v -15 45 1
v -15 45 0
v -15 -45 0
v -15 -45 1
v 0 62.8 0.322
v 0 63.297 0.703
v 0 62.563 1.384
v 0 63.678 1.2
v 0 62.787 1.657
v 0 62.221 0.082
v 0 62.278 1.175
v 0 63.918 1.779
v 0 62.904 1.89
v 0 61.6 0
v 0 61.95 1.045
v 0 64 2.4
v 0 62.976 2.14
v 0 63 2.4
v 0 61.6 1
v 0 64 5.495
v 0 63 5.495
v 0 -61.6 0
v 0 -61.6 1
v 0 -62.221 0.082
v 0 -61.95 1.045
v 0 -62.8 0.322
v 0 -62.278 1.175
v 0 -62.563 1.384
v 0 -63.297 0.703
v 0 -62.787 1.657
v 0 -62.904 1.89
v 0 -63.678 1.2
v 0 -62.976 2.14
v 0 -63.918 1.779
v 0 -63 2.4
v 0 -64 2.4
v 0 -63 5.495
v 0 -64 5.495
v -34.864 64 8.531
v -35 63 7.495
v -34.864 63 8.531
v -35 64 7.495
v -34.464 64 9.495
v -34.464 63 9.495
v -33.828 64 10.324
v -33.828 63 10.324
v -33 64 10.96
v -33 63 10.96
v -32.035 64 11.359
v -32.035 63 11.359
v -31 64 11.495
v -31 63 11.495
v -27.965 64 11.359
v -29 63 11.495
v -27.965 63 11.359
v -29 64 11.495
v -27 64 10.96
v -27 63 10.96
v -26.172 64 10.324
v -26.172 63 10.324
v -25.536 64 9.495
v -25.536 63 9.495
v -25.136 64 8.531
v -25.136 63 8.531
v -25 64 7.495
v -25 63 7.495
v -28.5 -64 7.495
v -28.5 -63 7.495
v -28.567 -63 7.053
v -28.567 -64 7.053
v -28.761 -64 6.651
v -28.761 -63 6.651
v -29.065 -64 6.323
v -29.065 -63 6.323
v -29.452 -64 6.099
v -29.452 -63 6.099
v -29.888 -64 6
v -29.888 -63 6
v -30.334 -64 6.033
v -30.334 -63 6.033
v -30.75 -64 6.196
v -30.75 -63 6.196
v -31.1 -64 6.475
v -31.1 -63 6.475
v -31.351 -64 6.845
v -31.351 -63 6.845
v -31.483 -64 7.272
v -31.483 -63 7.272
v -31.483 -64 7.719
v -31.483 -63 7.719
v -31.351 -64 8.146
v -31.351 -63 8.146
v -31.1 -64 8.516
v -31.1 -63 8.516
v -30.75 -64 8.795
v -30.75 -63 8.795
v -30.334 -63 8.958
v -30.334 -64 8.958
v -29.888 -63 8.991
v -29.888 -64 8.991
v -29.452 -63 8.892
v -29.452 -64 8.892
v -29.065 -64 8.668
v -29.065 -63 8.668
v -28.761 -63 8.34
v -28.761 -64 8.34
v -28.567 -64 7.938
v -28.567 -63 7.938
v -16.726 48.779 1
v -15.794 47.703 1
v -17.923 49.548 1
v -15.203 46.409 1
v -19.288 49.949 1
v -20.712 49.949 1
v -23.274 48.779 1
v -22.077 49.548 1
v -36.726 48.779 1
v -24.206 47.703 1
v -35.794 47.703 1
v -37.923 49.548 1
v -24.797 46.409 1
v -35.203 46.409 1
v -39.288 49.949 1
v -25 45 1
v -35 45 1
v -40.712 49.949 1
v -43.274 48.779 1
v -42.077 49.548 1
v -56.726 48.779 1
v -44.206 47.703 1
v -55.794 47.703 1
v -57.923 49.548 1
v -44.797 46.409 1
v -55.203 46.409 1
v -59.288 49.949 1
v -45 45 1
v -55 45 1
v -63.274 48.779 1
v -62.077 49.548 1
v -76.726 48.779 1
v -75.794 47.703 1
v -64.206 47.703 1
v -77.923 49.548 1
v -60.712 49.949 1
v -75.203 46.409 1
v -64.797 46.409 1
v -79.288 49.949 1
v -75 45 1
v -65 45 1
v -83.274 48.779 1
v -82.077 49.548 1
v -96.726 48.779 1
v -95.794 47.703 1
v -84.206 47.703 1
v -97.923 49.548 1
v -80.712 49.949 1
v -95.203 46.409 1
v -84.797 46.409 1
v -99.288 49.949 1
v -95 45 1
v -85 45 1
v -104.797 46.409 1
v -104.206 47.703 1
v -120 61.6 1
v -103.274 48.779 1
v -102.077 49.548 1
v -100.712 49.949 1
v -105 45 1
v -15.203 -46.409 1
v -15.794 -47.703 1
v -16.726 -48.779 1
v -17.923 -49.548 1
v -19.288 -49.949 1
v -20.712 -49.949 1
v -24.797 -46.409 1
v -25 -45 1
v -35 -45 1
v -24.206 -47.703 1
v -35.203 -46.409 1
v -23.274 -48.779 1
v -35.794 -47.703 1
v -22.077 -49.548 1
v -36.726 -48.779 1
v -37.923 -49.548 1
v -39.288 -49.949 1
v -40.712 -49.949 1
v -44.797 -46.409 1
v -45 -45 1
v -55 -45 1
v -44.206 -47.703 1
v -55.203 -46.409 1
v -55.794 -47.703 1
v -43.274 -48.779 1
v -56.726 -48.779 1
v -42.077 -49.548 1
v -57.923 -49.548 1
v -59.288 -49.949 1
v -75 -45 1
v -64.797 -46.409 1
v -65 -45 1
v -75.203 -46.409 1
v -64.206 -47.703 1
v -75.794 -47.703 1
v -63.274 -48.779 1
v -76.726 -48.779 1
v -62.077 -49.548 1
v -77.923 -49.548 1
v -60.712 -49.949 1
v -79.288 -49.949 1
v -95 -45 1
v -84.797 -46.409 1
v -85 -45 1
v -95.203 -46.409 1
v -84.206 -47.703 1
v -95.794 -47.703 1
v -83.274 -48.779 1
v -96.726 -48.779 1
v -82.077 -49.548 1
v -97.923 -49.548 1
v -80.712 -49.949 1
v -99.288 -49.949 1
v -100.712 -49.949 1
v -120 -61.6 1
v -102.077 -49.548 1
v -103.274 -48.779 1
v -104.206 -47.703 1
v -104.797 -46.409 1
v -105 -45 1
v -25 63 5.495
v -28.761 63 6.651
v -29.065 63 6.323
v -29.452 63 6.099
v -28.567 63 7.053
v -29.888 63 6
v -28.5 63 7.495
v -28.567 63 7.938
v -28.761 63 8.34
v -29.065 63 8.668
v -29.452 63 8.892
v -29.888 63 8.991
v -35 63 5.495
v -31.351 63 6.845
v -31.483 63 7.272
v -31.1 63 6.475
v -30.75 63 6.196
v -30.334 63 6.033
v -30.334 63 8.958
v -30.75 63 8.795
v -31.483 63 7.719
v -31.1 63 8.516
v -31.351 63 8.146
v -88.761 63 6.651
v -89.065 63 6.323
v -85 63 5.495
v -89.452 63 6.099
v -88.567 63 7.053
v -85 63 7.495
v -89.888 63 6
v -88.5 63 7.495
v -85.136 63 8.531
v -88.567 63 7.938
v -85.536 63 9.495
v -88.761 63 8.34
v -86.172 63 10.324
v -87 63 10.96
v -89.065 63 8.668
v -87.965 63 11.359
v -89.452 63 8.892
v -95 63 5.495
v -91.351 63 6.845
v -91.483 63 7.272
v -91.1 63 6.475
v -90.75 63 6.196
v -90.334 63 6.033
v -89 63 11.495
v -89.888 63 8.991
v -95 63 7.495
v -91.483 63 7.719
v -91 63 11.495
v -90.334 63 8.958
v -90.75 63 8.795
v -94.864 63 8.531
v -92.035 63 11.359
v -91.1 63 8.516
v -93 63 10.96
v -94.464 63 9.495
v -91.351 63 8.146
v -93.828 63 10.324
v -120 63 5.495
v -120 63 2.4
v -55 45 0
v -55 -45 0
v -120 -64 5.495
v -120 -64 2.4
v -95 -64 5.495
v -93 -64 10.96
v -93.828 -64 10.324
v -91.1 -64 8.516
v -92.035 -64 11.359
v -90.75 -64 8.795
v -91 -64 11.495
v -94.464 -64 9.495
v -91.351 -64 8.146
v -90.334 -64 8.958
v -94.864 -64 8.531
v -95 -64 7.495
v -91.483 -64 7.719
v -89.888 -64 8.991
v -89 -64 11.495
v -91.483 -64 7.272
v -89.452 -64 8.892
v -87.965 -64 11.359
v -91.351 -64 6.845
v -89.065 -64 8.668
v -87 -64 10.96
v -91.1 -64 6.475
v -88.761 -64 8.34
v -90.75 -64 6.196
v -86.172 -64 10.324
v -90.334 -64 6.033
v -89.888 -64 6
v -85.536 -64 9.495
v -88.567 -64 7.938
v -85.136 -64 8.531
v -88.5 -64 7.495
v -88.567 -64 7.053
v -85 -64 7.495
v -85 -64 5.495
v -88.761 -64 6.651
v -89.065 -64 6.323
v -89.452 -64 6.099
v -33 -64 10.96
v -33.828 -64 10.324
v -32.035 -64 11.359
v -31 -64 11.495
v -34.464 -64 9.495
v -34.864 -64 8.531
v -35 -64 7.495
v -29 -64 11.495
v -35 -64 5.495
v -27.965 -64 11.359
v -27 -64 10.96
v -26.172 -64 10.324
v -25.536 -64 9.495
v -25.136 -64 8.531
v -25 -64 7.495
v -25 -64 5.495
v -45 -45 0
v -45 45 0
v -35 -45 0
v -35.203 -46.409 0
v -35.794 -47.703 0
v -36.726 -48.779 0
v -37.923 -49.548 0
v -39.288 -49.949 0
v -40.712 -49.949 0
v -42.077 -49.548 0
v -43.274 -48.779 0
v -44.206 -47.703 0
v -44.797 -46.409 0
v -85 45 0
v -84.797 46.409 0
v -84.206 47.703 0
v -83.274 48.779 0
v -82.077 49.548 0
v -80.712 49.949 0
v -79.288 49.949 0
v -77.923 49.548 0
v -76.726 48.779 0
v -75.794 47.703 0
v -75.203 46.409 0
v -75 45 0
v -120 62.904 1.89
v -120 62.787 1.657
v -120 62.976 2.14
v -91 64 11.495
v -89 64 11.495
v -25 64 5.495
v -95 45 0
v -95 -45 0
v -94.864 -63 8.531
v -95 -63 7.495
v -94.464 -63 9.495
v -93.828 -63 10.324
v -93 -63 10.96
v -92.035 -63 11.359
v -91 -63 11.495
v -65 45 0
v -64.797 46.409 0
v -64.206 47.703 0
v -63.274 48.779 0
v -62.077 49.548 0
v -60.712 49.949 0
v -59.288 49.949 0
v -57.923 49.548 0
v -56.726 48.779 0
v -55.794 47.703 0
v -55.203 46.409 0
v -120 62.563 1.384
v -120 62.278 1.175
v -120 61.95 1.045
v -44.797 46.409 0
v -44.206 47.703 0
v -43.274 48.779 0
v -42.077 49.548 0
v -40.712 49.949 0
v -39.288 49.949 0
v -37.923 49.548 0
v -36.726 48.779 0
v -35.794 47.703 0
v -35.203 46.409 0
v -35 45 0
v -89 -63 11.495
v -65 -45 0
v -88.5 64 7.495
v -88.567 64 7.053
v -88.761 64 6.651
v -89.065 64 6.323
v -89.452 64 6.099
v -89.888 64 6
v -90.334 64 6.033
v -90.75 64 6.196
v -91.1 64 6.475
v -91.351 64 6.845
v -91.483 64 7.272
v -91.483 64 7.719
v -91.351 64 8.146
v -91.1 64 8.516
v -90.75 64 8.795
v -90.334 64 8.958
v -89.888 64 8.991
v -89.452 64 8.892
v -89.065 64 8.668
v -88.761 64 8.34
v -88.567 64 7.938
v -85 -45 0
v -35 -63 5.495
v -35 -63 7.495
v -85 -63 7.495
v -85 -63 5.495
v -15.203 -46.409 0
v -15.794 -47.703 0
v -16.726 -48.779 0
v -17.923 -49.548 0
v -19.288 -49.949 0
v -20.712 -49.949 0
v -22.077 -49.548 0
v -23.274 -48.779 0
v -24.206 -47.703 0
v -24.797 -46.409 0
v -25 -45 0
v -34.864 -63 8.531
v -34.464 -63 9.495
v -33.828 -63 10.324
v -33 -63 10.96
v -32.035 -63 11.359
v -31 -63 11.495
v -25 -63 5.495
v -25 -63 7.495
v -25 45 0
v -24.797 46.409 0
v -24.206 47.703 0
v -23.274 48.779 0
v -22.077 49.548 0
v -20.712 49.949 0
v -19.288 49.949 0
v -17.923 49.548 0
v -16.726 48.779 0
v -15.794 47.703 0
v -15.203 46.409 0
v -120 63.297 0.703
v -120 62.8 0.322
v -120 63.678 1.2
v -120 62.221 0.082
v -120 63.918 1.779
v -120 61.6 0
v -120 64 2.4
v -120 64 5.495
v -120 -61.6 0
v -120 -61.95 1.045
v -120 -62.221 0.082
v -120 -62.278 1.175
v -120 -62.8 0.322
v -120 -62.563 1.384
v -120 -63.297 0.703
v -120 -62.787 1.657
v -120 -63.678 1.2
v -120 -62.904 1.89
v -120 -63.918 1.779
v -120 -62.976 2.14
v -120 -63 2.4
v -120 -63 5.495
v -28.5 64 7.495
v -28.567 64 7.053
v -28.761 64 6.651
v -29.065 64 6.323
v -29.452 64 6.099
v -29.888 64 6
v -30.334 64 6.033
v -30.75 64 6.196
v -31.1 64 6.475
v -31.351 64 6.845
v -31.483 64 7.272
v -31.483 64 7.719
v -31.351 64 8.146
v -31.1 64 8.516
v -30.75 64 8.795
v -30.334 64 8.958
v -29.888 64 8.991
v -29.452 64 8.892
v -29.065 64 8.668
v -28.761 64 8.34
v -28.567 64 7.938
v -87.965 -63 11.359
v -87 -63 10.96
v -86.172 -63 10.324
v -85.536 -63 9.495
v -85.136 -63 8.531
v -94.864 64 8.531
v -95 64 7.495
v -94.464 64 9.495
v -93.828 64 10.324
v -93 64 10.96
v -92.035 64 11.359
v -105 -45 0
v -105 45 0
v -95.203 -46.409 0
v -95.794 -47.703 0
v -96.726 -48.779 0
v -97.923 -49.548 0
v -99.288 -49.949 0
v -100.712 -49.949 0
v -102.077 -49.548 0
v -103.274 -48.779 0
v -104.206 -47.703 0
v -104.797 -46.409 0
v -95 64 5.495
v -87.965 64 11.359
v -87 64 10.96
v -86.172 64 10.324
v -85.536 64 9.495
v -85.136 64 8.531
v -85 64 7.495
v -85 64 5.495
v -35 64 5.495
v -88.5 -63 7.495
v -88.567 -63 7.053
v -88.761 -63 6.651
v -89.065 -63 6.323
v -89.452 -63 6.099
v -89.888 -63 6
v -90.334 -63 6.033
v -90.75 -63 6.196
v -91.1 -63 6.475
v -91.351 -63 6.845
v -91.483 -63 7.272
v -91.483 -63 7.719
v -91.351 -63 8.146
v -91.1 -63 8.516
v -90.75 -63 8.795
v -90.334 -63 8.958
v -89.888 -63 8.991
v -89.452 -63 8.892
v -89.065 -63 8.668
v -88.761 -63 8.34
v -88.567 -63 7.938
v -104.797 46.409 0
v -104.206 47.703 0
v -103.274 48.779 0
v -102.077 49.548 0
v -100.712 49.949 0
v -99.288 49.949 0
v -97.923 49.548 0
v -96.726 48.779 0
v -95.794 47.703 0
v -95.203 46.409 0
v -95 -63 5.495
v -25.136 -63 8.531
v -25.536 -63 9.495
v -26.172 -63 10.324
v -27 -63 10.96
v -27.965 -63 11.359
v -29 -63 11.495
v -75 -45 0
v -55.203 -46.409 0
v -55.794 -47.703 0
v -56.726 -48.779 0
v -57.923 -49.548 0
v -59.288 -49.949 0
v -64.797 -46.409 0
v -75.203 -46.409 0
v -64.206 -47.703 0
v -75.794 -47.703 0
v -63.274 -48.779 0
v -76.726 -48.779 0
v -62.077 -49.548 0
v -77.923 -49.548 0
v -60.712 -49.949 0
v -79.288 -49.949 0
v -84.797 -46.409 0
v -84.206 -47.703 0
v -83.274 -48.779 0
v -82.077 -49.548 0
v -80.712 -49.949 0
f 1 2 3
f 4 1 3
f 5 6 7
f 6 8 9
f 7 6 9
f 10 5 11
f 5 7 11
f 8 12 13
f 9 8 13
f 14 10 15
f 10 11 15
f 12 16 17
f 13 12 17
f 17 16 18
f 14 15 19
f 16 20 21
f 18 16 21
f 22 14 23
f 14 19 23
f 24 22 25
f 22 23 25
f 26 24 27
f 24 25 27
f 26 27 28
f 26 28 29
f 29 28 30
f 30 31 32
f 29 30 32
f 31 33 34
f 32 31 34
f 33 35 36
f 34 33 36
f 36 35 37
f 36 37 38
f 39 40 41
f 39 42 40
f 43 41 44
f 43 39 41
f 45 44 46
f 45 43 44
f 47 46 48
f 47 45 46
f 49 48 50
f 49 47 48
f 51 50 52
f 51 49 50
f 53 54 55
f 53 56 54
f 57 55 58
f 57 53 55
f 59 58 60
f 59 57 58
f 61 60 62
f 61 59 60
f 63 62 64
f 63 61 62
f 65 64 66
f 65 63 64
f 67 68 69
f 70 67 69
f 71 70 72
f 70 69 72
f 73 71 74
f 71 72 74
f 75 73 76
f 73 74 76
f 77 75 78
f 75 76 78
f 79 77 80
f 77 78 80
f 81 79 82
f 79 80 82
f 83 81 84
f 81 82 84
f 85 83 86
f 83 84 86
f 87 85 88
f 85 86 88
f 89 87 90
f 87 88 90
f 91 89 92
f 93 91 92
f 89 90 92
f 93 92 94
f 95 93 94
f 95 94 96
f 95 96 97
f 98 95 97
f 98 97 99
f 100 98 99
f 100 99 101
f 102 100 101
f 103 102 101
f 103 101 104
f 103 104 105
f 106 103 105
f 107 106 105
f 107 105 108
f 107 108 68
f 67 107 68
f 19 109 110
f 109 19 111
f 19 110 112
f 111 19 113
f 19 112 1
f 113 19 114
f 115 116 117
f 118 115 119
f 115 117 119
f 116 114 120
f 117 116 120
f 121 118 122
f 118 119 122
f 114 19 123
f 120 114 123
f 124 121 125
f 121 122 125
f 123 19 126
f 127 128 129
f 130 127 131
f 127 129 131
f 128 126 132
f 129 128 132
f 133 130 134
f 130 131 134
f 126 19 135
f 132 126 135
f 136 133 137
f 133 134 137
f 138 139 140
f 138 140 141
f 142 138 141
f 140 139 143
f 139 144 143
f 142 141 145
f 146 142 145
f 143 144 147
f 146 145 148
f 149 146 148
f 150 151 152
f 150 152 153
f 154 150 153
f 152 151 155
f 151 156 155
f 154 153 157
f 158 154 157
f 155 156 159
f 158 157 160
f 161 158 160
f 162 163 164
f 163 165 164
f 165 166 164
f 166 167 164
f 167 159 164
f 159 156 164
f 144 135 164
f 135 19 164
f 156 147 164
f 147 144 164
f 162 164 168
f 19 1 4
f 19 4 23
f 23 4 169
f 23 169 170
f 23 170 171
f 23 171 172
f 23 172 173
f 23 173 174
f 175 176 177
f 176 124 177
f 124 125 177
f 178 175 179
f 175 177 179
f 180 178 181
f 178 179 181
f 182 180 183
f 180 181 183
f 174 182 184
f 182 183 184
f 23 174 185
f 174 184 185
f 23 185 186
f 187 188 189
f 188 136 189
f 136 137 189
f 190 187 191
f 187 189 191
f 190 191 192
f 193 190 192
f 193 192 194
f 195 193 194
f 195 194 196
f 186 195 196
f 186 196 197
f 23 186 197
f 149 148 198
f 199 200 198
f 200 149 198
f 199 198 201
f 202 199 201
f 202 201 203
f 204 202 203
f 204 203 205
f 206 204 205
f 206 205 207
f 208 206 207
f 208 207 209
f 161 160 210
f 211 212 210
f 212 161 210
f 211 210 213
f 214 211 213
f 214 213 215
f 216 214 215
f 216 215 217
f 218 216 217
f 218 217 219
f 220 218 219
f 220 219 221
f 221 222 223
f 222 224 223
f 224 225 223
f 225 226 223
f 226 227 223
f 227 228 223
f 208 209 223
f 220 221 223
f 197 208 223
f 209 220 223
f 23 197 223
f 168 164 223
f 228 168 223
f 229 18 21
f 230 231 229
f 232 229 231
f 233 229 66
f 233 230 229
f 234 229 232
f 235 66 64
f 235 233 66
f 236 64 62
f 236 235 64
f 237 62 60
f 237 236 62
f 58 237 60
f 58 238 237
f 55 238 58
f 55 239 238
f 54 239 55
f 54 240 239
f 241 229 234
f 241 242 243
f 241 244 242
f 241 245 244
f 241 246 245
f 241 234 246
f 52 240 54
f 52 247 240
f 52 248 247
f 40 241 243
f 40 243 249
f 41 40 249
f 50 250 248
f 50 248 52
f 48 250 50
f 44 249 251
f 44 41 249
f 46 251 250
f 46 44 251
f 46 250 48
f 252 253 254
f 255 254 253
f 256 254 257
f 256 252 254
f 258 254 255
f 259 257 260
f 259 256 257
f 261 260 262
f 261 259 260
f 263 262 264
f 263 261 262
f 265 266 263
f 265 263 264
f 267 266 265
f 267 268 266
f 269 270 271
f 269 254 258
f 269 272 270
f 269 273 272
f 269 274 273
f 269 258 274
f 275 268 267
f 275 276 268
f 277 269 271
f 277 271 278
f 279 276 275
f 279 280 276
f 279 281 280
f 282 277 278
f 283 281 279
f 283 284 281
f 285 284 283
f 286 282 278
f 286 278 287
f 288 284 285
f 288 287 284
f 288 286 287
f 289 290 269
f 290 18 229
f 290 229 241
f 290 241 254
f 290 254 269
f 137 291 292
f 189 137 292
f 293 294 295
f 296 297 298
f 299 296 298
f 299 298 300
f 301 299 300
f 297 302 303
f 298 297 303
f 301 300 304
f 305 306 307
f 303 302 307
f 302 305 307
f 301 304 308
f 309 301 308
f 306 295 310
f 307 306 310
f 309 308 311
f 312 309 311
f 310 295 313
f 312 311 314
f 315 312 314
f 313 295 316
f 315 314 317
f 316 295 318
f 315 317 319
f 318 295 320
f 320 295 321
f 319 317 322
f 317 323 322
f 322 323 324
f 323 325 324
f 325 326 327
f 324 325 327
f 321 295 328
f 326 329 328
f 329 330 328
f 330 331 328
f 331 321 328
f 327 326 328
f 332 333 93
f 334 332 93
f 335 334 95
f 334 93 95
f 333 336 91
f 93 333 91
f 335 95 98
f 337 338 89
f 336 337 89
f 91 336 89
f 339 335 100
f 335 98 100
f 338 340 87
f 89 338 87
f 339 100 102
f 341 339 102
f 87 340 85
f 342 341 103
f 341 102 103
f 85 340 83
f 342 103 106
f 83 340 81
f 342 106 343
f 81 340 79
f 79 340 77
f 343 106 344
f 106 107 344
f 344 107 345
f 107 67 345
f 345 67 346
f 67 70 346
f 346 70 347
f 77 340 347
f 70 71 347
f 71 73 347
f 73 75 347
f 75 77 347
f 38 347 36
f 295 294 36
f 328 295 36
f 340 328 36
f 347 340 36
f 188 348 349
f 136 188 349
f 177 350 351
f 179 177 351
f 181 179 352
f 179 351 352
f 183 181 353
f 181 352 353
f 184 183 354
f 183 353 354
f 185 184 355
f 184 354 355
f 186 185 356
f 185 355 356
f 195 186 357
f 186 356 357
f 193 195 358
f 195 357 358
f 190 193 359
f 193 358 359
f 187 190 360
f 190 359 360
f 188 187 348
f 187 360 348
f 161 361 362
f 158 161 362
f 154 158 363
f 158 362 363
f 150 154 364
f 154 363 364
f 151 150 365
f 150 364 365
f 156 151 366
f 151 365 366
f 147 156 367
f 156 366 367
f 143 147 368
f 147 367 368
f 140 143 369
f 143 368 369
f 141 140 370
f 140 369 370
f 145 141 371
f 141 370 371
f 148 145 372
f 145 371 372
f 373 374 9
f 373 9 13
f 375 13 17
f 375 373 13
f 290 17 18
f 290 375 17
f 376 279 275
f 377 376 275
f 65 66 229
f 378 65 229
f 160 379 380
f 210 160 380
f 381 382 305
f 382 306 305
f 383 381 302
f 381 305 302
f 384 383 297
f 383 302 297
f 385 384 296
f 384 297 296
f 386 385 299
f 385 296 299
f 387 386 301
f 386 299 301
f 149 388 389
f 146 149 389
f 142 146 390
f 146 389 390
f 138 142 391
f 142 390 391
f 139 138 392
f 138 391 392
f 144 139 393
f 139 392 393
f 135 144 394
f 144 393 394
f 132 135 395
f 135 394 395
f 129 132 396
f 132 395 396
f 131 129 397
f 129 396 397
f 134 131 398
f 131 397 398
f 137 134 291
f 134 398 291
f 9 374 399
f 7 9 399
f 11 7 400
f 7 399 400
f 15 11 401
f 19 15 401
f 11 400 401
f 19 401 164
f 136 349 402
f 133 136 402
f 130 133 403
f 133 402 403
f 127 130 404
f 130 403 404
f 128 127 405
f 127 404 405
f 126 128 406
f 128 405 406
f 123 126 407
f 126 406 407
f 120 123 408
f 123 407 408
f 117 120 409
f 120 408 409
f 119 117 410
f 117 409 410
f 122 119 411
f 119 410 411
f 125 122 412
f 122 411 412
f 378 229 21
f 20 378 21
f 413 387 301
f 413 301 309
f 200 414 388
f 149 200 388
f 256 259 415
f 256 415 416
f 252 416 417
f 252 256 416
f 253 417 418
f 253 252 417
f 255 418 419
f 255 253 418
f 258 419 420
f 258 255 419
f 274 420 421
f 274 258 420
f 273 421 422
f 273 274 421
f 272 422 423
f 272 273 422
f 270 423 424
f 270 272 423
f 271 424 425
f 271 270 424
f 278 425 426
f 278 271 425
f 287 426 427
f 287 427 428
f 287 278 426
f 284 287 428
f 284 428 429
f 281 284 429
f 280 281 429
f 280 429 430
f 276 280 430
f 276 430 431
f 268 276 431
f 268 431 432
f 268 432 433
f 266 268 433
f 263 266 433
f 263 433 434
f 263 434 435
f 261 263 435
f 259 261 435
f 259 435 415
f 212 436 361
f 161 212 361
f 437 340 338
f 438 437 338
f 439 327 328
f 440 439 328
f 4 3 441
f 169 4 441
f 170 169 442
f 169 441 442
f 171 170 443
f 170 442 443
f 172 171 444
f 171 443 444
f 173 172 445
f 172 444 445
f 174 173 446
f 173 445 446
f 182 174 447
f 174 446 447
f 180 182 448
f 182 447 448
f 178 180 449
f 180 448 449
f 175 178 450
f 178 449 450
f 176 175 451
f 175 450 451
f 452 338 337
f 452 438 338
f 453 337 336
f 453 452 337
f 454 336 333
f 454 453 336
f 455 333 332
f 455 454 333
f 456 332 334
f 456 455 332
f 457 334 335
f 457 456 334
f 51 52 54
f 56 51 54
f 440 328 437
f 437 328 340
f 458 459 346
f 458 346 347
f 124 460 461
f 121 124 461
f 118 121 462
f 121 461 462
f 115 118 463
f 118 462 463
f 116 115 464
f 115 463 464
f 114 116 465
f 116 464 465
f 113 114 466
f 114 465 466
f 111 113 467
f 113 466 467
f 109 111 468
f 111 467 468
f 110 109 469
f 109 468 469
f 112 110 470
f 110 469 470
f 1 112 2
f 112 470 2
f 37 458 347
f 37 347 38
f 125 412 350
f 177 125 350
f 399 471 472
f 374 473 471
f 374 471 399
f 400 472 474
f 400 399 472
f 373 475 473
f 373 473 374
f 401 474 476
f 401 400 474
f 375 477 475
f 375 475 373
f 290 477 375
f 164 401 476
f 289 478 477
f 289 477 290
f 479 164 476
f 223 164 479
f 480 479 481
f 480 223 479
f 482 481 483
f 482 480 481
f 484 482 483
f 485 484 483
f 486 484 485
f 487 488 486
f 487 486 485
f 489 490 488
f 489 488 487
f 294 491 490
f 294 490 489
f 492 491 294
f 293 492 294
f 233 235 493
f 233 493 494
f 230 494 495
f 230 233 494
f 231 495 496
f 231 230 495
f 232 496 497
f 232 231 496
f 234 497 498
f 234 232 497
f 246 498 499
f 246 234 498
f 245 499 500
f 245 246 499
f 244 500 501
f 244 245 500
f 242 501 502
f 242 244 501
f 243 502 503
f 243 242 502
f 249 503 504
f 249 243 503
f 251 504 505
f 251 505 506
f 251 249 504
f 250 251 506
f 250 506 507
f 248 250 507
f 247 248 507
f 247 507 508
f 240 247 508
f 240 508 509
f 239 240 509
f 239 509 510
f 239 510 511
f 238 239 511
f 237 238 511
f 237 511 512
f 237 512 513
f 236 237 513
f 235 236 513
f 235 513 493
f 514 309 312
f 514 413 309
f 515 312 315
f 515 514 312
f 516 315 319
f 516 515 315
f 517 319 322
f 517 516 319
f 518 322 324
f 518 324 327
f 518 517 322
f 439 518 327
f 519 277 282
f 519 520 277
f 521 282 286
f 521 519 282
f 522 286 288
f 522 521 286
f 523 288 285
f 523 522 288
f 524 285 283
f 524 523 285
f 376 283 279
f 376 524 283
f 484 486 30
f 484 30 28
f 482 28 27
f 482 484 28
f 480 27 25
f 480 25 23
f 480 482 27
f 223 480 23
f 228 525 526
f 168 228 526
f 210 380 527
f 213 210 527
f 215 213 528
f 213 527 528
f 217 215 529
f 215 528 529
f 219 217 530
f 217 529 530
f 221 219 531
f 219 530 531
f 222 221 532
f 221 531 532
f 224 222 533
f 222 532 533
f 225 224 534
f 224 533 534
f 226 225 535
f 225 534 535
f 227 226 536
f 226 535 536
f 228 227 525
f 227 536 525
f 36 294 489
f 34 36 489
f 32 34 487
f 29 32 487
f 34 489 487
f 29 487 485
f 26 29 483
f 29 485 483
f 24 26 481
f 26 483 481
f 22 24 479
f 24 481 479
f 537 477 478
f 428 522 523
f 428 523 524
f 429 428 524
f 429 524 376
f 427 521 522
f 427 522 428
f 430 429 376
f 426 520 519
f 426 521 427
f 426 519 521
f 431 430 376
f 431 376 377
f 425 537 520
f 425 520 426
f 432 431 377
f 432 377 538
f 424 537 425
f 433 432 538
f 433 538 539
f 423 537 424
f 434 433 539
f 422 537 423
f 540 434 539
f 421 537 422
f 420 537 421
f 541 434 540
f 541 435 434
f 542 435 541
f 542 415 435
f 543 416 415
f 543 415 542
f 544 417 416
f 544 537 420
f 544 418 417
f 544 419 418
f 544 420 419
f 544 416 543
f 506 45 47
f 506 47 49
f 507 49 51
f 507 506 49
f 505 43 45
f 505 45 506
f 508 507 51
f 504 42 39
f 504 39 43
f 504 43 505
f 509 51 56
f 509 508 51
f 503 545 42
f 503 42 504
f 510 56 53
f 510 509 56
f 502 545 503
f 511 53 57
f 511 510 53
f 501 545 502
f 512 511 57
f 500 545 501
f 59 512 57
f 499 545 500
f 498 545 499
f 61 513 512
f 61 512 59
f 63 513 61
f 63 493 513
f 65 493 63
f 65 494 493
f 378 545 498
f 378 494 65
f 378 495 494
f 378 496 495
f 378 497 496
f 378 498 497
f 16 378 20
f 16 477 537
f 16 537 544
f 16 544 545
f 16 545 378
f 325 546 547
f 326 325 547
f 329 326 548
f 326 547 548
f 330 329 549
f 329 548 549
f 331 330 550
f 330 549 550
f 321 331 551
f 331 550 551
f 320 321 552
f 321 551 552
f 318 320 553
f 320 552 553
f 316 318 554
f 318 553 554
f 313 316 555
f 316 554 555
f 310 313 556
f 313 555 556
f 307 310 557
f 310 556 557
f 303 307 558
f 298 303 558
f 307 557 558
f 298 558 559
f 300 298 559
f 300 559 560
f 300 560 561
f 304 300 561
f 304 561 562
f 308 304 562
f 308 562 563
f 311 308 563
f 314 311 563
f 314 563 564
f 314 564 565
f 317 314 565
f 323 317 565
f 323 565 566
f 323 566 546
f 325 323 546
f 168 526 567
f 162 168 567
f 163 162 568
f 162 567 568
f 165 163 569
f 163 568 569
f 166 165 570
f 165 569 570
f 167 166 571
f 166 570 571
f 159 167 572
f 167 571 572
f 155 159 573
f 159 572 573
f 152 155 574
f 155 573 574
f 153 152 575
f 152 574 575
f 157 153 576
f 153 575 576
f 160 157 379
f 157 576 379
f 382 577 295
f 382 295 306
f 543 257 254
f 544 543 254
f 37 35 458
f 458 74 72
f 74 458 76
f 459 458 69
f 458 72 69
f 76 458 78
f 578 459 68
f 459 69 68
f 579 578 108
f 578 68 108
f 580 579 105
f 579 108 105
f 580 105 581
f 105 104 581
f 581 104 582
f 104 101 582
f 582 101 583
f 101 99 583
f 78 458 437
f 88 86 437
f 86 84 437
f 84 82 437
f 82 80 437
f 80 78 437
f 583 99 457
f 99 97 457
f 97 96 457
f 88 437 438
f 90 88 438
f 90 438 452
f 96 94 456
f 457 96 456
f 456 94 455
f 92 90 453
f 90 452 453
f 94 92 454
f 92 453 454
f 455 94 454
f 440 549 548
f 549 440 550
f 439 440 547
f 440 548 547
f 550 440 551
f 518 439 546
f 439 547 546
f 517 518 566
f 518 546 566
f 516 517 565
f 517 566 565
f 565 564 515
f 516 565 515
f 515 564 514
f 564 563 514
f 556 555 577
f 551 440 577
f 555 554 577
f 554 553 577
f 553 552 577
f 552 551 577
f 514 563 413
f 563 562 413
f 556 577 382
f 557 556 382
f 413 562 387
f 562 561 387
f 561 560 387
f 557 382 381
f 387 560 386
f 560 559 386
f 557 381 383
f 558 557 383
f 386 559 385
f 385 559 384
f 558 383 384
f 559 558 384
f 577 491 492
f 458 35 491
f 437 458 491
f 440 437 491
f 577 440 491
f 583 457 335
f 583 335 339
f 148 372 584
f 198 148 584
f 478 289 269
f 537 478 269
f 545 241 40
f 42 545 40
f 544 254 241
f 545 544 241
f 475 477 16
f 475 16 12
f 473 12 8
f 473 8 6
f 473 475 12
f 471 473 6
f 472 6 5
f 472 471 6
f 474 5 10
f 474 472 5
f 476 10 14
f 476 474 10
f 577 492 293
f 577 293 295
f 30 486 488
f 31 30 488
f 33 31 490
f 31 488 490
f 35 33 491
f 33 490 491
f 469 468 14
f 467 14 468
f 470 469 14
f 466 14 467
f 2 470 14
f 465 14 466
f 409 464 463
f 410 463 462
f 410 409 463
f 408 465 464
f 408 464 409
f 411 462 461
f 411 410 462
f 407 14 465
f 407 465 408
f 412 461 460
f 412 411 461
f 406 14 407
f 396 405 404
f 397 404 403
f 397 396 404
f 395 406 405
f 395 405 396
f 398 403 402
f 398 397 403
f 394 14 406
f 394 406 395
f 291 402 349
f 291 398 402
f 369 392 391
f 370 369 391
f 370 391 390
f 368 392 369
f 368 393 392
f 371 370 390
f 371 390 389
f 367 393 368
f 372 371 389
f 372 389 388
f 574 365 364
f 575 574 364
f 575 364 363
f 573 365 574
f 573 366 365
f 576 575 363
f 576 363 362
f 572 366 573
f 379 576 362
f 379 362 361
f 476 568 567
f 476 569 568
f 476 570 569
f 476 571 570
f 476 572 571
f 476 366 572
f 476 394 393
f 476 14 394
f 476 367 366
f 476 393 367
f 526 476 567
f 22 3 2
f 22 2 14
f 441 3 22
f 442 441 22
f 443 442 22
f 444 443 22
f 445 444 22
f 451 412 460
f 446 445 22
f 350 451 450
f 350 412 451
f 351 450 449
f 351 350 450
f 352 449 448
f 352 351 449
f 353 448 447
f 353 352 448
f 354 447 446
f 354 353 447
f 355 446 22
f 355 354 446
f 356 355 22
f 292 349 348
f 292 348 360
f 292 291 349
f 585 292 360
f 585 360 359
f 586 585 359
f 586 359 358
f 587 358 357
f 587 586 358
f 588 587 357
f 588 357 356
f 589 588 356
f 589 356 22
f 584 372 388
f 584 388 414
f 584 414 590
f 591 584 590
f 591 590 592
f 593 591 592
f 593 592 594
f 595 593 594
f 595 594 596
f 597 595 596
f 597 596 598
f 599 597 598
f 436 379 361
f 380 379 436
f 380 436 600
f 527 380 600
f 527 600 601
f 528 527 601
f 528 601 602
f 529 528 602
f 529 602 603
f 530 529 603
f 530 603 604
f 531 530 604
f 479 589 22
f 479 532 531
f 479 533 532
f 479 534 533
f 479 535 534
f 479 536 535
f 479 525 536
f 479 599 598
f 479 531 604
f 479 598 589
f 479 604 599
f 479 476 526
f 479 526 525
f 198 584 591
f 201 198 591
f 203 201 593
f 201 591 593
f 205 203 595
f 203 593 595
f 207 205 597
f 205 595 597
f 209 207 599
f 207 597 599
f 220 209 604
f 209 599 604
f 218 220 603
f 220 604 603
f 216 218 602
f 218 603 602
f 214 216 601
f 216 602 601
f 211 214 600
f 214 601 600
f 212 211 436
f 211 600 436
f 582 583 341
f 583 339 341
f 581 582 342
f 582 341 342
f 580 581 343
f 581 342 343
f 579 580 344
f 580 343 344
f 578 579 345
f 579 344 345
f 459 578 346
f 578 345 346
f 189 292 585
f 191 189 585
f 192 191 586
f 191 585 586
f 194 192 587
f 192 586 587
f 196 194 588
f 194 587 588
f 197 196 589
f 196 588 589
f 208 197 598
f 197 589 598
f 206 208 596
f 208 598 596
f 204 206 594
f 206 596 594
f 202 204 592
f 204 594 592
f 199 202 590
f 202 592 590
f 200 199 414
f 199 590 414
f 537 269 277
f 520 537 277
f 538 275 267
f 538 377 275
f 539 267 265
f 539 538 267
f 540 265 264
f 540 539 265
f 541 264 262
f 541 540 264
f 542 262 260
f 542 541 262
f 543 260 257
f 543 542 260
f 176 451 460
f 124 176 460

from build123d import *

# Parameters (mm, degrees)
CROQUIS1_W                      = 64
CROQUIS1_H                      = 120
CROQUIS1_R                      = 1.5
CROQUIS1_W_2                    = 2
CROQUIS1_H_2                    = 40
SALIENTE_EXTRUIR1_DEPTH         = 1
PLIEGUE_START                   = 63.746512
PLIEGUE_CROQUIZADO1_OUTLINE_W   = 120
PLIEGUE_CROQUIZADO1_OUTLINE_H   = 1
PLIEGUE_CROQUIZADO1_DEPTH       = 9.933488
PLIEGUE_START_2                 = 62.786512
PLIEGUE_CROQUIZADO1_2_OUTLINE_R = 1.5
PLIEGUE_CROQUIZADO1_2_DEPTH     = 1.213488
PLIEGUE_START_3                 = -121
PLIEGUE_CROQUIZADO1_3_DEPTH     = 122
PLIEGUE_START_4                 = -120
PLIEGUE_CROQUIZADO1_4_DEPTH     = 120
CORTAR_EXTRUIR1_REACH           = 138.485
CORTAR_EXTRUIR2_DEPTH           = 184
REDONDEO1_R                     = 4


with BuildPart() as part:
    # Croquis1 → Saliente-Extruir1 (new body)
    # profile 1 of 5: a face of its own
    with BuildSketch(Plane(origin=(0, 0, 0), x_dir=(0, 1, 0), z_dir=(0, 0, 1))):
        with Locations((32, 60)):
            Rectangle(CROQUIS1_W, CROQUIS1_H)
    # profile 2 of 5: a face of its own
    with BuildSketch(Plane(origin=(0, 0, 0), x_dir=(0, 1, 0), z_dir=(0, 0, 1))):
        Polygon((64, 120), (64, 0), (67.68, 0), (67.68, 25), (67.68, 40), (67.68, 80), (67.68, 95), (67.68, 120), align=None)
    # profile 3 of 5: a face of its own
    with BuildSketch(Plane(origin=(0, 0, 0), x_dir=(0, 1, 0), z_dir=(0, 0, 1))):
        Polygon((67.68, 40), (67.68, 25), (73.68, 25), (73.68, 40), (69.68, 40), align=None)
        with Locations(Location((69.68, 30, 0), (0, 0, 270))):
            Circle(CROQUIS1_R, mode=Mode.SUBTRACT)
    # profile 4 of 5: a face of its own
    with BuildSketch(Plane(origin=(0, 0, 0), x_dir=(0, 1, 0), z_dir=(0, 0, 1))):
        Polygon((73.68, 95), (67.68, 95), (67.68, 80), (69.68, 80), (73.68, 80), align=None)
        with Locations(Location((69.68, 90, 0), (0, 0, 270))):
            Circle(CROQUIS1_R, mode=Mode.SUBTRACT)
    # profile 5 of 5: a face of its own
    with BuildSketch(Plane(origin=(0, 0, 0), x_dir=(0, 1, 0), z_dir=(0, 0, 1))):
        with Locations((68.68, 60)):
            Rectangle(CROQUIS1_W_2, CROQUIS1_H_2)
    extrude(amount=SALIENTE_EXTRUIR1_DEPTH)

    # Pliegue croquizado1: read off the stored shape, not the designer's step
    # Pliegue croquizado1 outline → Pliegue croquizado1 (cut)
    with BuildSketch(Plane(origin=(0, 0, 0), x_dir=(1, 0, 0), z_dir=(0, 1, 0)).offset(PLIEGUE_START)):
        with Locations((-60, -0.5)):
            Rectangle(PLIEGUE_CROQUIZADO1_OUTLINE_W, PLIEGUE_CROQUIZADO1_OUTLINE_H)
    extrude(amount=PLIEGUE_CROQUIZADO1_DEPTH, mode=Mode.SUBTRACT)

    # Pliegue croquizado1 2 outline → Pliegue croquizado1 2 (add)
    with BuildSketch(Plane(origin=(0, 0, 0), x_dir=(1, 0, 0), z_dir=(0, 1, 0)).offset(PLIEGUE_START_2)):
        Polygon((-95, -11.495486979), (-80, -11.495486979), (-80, -7.495486979), (-40, -7.495486979), (-40, -11.495486979), (-25, -11.495486979), (-25, -5.495486979), (0, -5.495486979), (0, -1), (-120, -1), (-120, -5.495486979), (-95, -5.495486979), align=None)
        with Locations((-90, -7.495486979)):
            Circle(PLIEGUE_CROQUIZADO1_2_OUTLINE_R, mode=Mode.SUBTRACT)
        with Locations((-30, -7.495486979)):
            Circle(PLIEGUE_CROQUIZADO1_2_OUTLINE_R, mode=Mode.SUBTRACT)
    extrude(amount=PLIEGUE_CROQUIZADO1_2_DEPTH)

    # Pliegue croquizado1 3 outline → Pliegue croquizado1 3 (cut)
    with BuildSketch(Plane.YZ.offset(PLIEGUE_START_3)):
        with BuildLine():
            Line((63, 11.495486979), (62.786512, 11.495486979))
            Line((62.786512, 11.495486979), (62.786512, 1.656905608))
            ThreePointArc((62.786512, 1.656905608), (62.945569917, 2.013423228), (63, 2.4))
            Line((63, 2.4), (63, 11.495486979))
        make_face()
        with BuildLine():
            Line((64, 1), (64, 2.4))
            ThreePointArc((64, 2.4), (63.297056275, 0.702943725), (61.6, 0))
            Line((61.6, 0), (63.746512, 0))
            Line((63.746512, 0), (63.746512, 1))
            Line((63.746512, 1), (64, 1))
        make_face()
    extrude(amount=PLIEGUE_CROQUIZADO1_3_DEPTH, mode=Mode.SUBTRACT)

    # Pliegue croquizado1 4 outline → Pliegue croquizado1 4 (add)
    with BuildSketch(Plane.YZ.offset(PLIEGUE_START_4)):
        with BuildLine():
            Line((62.786512, 1), (62.786512, 1.656905608))
            ThreePointArc((62.786512, 1.656905608), (62.278110556, 1.175187331), (61.6, 1))
            Line((61.6, 1), (62.786512, 1))
        make_face()
    extrude(amount=PLIEGUE_CROQUIZADO1_4_DEPTH)

    # Simetría1: part across plane


with BuildPart() as part_1:
    add(part.part)
    add(part.part.mirror(Plane(origin=(0, 0, 1), x_dir=(0, 0, 1), z_dir=(0, 1, 0))))

    # Croquis7 → Cortar-Extruir1 (cut, up to next)
    with BuildSketch(Plane(origin=(0, 0, 0), x_dir=(-1, 0, 0), z_dir=(0, 0, -1)), mode=Mode.PRIVATE) as cortar_extruir1_sk1:
        with BuildLine():
            Line((35, 45.000000776), (35, -45.000000776))
            ThreePointArc((35, -45.000000776), (40.000000388, -50), (45, -45))
            Line((45, -45), (45, 45))
            ThreePointArc((45, 45), (40.000000388, 50), (35, 45.000000776))
        make_face()
    cortar_extruir1_tool1 = extrude(cortar_extruir1_sk1.sketch, amount=-CORTAR_EXTRUIR1_REACH, mode=Mode.PRIVATE) & part_1.part
    # Croquis7 → Cortar-Extruir1 (cut, up to next)
    with BuildSketch(Plane(origin=(0, 0, 0), x_dir=(-1, 0, 0), z_dir=(0, 0, -1)), mode=Mode.PRIVATE) as cortar_extruir1_sk2:
        with BuildLine():
            Line((15, 45.000000776), (15, -45.000000776))
            ThreePointArc((15, -45.000000776), (20.000000388, -50), (25, -45))
            Line((25, -45), (25, 45))
            ThreePointArc((25, 45), (20.000000388, 50), (15, 45.000000776))
        make_face()
    cortar_extruir1_tool2 = extrude(cortar_extruir1_sk2.sketch, amount=-CORTAR_EXTRUIR1_REACH, mode=Mode.PRIVATE) & part_1.part
    # Croquis7 → Cortar-Extruir1 (cut, up to next)
    with BuildSketch(Plane(origin=(0, 0, 0), x_dir=(-1, 0, 0), z_dir=(0, 0, -1)), mode=Mode.PRIVATE) as cortar_extruir1_sk3:
        with BuildLine():
            Line((55, 45.000000776), (55, -45.000000776))
            ThreePointArc((55, -45.000000776), (60.000000388, -50), (65, -45))
            Line((65, -45), (65, 45))
            ThreePointArc((65, 45), (60.000000388, 50), (55, 45.000000776))
        make_face()
    cortar_extruir1_tool3 = extrude(cortar_extruir1_sk3.sketch, amount=-CORTAR_EXTRUIR1_REACH, mode=Mode.PRIVATE) & part_1.part
    # Croquis7 → Cortar-Extruir1 (cut, up to next)
    with BuildSketch(Plane(origin=(0, 0, 0), x_dir=(-1, 0, 0), z_dir=(0, 0, -1)), mode=Mode.PRIVATE) as cortar_extruir1_sk4:
        with BuildLine():
            Line((75, 45.000000776), (75, -45.000000776))
            ThreePointArc((75, -45.000000776), (80.000000388, -50), (85, -45))
            Line((85, -45), (85, 45))
            ThreePointArc((85, 45), (80.000000388, 50), (75, 45.000000776))
        make_face()
    cortar_extruir1_tool4 = extrude(cortar_extruir1_sk4.sketch, amount=-CORTAR_EXTRUIR1_REACH, mode=Mode.PRIVATE) & part_1.part
    # Croquis7 → Cortar-Extruir1 (cut, up to next)
    with BuildSketch(Plane(origin=(0, 0, 0), x_dir=(-1, 0, 0), z_dir=(0, 0, -1)), mode=Mode.PRIVATE) as cortar_extruir1_sk5:
        with BuildLine():
            Line((95, 45.000000776), (95, -45.000000776))
            ThreePointArc((95, -45.000000776), (100.000000388, -50), (105, -45))
            Line((105, -45), (105, 45))
            ThreePointArc((105, 45), (100.000000388, 50), (95, 45.000000776))
        make_face()
    cortar_extruir1_tool5 = extrude(cortar_extruir1_sk5.sketch, amount=-CORTAR_EXTRUIR1_REACH, mode=Mode.PRIVATE) & part_1.part
    add(cortar_extruir1_tool1.solids().sort_by_distance((-40, 0, 0))[0], mode=Mode.SUBTRACT)
    add(cortar_extruir1_tool2.solids().sort_by_distance((-20, 0, 0))[0], mode=Mode.SUBTRACT)
    add(cortar_extruir1_tool3.solids().sort_by_distance((-60, 0, 0))[0], mode=Mode.SUBTRACT)
    add(cortar_extruir1_tool4.solids().sort_by_distance((-80, 0, 0))[0], mode=Mode.SUBTRACT)
    add(cortar_extruir1_tool5.solids().sort_by_distance((-100, 0, 0))[0], mode=Mode.SUBTRACT)

    # Croquis8 → Cortar-Extruir2 (cut)
    with BuildSketch(Plane.XZ.offset(64)):
        Polygon((-80, 11.495486979), (-85, 11.495486979), (-85, 5.495486979), (-80, 5.495486979), (-40, 5.495486979), (-35, 5.495486979), (-35, 11.495486979), (-40, 11.495486979), (-40, 7.495486979), (-80, 7.495486979), align=None)
    extrude(amount=-CORTAR_EXTRUIR2_DEPTH, mode=Mode.SUBTRACT)

    # Redondeo1
    redondeo1_edges = [part_1.edges().sort_by_distance(p)[0] for p in [
        (-95, -63.5, 11.495486979),
        (-25, -63.5, 11.495486979),
        (-25, 63.5, 11.495486979),
        (-95, 63.5, 11.495486979),
        (-35, 63.5, 11.495486979),
        (-85, 63.5, 11.495486979),
        (-35, -63.5, 11.495486979),
        (-85, -63.5, 11.495486979),
    ]]
    fillet(redondeo1_edges, radius=REDONDEO1_R)


solid = part_1.part
